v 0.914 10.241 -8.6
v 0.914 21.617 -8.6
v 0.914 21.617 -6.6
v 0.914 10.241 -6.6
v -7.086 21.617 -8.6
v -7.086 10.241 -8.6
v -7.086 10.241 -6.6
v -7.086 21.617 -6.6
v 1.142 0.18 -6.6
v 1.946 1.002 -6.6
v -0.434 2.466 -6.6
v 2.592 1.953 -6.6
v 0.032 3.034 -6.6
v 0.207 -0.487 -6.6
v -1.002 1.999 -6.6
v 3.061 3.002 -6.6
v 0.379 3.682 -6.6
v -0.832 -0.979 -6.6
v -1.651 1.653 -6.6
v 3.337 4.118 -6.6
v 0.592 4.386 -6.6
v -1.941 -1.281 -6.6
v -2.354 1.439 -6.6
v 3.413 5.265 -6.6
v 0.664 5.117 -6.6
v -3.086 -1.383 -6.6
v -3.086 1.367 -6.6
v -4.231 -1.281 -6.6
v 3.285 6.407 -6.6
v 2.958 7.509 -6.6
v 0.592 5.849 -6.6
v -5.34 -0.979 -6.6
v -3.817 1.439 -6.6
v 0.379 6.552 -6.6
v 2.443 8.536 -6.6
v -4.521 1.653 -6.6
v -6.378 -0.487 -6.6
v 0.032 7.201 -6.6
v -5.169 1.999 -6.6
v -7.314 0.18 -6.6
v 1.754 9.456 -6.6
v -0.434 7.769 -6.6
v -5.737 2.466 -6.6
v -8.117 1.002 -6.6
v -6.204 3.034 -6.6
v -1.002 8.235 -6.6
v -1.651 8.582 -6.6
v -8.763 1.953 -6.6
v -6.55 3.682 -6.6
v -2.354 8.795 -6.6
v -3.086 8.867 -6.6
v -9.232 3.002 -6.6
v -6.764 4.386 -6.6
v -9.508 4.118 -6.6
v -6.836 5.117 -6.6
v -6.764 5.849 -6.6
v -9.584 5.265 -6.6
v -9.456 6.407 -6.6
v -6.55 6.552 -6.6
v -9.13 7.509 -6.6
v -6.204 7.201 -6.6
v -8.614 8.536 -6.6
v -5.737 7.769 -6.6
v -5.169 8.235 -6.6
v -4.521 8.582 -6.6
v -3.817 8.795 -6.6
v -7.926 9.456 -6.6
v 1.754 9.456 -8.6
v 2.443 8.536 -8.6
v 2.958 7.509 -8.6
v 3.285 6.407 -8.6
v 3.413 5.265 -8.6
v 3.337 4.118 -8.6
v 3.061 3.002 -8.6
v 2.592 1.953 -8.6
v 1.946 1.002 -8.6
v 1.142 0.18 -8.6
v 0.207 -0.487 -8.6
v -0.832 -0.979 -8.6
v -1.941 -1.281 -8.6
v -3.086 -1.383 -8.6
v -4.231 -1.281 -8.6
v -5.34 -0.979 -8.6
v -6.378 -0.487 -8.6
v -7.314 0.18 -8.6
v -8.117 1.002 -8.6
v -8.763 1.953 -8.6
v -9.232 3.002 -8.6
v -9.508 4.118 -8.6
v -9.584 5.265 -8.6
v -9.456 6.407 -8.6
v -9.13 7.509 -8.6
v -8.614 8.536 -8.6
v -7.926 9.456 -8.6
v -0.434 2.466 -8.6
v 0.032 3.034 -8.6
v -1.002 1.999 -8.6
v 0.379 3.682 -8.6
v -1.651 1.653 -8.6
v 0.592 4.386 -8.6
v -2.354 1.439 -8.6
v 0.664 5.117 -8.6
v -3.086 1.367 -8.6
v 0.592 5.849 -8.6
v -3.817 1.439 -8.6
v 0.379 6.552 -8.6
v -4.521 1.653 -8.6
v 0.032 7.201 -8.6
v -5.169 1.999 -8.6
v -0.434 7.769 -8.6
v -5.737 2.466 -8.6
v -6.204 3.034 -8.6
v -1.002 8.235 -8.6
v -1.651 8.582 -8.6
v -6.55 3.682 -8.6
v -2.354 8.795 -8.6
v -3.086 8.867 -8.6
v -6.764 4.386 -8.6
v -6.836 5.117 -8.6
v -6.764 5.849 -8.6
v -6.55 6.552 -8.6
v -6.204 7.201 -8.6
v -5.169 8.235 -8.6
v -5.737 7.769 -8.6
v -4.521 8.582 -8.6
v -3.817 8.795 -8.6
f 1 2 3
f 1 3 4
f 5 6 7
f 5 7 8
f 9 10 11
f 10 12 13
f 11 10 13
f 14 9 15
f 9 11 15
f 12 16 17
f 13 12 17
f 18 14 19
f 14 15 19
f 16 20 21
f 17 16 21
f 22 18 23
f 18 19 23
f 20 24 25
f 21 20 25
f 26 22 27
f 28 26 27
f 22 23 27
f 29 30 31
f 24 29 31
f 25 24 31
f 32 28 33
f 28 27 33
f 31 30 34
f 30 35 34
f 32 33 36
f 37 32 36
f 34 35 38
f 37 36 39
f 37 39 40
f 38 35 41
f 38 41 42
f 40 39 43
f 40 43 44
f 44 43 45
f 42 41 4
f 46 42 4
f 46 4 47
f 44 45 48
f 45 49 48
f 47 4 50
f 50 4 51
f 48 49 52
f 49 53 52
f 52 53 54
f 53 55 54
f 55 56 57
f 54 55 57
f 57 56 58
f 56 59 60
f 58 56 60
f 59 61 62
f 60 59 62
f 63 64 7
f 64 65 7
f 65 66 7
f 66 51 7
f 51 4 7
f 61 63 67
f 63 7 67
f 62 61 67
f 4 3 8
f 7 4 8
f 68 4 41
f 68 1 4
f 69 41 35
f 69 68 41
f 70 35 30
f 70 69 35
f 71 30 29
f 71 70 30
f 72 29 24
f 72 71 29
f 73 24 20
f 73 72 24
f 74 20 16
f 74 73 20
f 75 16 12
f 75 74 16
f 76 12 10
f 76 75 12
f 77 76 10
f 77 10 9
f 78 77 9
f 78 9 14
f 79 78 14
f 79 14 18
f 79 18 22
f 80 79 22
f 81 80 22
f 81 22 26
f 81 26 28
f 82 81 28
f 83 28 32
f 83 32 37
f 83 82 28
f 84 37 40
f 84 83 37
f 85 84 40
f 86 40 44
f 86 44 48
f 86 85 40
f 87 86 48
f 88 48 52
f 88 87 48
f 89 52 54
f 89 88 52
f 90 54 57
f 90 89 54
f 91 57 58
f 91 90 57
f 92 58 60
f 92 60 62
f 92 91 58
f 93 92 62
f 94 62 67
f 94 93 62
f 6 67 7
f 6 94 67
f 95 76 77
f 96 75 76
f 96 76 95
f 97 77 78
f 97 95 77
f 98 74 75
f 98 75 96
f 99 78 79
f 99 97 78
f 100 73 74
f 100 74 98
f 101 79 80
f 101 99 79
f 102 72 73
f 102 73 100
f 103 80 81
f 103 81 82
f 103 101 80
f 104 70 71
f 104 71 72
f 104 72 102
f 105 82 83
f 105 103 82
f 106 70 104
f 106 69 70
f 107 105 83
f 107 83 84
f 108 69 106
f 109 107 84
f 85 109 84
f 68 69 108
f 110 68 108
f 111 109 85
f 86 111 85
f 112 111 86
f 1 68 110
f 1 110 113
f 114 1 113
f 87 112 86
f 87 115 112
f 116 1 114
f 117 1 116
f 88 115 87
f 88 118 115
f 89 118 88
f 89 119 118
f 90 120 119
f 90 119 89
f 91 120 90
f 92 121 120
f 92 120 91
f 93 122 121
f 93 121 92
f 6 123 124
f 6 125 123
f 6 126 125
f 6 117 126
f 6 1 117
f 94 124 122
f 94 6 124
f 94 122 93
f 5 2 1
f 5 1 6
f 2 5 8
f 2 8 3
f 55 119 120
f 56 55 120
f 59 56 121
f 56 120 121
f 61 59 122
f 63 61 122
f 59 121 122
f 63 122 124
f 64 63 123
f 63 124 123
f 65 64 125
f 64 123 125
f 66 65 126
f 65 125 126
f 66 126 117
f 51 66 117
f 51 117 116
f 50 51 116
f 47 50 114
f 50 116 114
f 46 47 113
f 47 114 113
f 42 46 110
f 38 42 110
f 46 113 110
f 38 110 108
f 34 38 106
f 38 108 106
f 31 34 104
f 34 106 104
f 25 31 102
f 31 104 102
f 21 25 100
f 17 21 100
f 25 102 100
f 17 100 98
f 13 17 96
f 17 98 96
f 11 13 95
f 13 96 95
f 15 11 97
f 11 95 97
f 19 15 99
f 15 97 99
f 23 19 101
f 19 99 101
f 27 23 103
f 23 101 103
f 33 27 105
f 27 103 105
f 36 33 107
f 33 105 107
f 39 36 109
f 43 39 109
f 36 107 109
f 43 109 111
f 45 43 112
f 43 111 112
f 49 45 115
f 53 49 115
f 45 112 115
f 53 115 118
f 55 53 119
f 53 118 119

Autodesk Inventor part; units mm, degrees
ref_plane "YZ Plane" through (0, 0, 0) normal (1, 0, 0) x (0, 1, 0)
ref_plane "XZ Plane" through (0, 0, 0) normal (0, 1, 0) x (-1, 0, 0)
ref_plane "Work Plane1" through (0, 0, -6.6) normal (0, 0, -1) x (-1, 0, 0)
sketch "Sketch1" plane through (0, 0, -6.6) normal (0, 0, -1) x (-1, 0, 0)
  circle A0 centre (3.0857, 5.1173) radius 10 projected
  line L0 (-6.9143, 5.1173) -> (-6.9143, 18.1173)
  line L1 (-6.9143, 18.1173) -> (13.0857, 18.1173)
  line L2 (13.0857, 18.1173) -> (13.0857, 5.1173)
  circle A1 centre (0, 0) radius 5
  point P0 (0, 0)
  dimension "d24" = 13
  dimension "d25" = 20
ref_plane "Work Plane2" through (-10, -10, -4.4) normal (0, 0, 1) x (1, 0, 0)
extrude "Extrusion1" add sketch "Sketch1" along normal blind 2 contours A0 A1 | A0 L0 L1 L2 | A0 A1 picked at (6.1055, 10.6249) picked at (0.8611, -2.5748)
sketch "Sketch9" plane through (0, 0, -8.6) normal (0, 0, -1) x (-1, 0, 0)
  circle A0 centre (3.0857, 5.1173) radius 5 construction
  arc A1 (-6.9143, 5.1173) -> (13.0857, 5.1173) centre (3.0857, 5.1173) ccw projected
  circle A2 centre (3.0857, 5.1173) radius 3.75
  dimension "d43" = 7.5
extrude "Extrusion6" cut sketch "Sketch9" against normal up to surface (2 mm away)
sketch "Sketch10" plane through (0, 0, -8.6) normal (0, 0, -1) x (-1, 0, 0)
  arc A0 (-6.9143, 5.1173) -> (13.0857, 5.1173) centre (3.0857, 5.1173) ccw projected
  line L0 (3.0857, -4.8827) -> (3.0857, -2.8827)
  line L1 (3.0857, -2.8827) -> (4.5857, -2.8827)
  line L2 (4.5857, -2.8827) -> (3.0857, -2.8827)
  line L3 (-2.1325, -2.8827) -> (-2.1325, -5.7607)
  line L4 (4.5857, -2.8827) -> (4.5857, -3.3119)
  line L5 (-2.1325, -5.7607) -> (-2.1325, -7.2943)
  line L6 (4.5857, -3.3119) -> (4.5857, -2.7408)
  line L7 (-4, 15) -> (-4, 13) construction
  line L8 (4, 13) -> (4, 15) construction
  line L9 (13.0857, 18.1173) -> (-6.9143, 18.1173) projected
  line L10 (-6.9143, 18.1173) -> (13.0857, 18.1173)
  line L11 (-6.9143, 18.1173) -> (-6.9143, 5.1173)
  line L12 (13.0857, 18.1173) -> (13.0857, 5.1173)
  arc A1 (-6.9143, 5.1173) -> (13.0857, 5.1173) centre (3.0857, 5.1173) ccw
  circle A2 centre (3.0857, 5.1173) radius 6.5
  line L13 (3.0857, 5.1173) -> (3.0857, 11.6173) construction
  line L14 (3.0857, 11.6173) -> (7.0857, 11.6173)
  line L15 (7.0857, 11.6173) -> (3.0857, 11.6173)
  line L16 (3.0857, 11.6173) -> (-0.9143, 11.6173)
  line L17 (-0.9143, 10.2408) -> (-0.9143, 18.1173)
  line L18 (-0.9143, 18.1173) -> (7.0857, 18.1173)
  line L19 (7.0857, 18.1173) -> (7.0857, 10.2408)
  point P0 (5.6921, -0.9362)
  dimension "d31" = 2
  dimension "d37" = 1.5
  dimension "d44" = 4
  dimension "d45" = 4
extrude "Extrusion8" cut sketch "Sketch10" against normal up to next contours A0 L11 L9 L17 A2 L19 L12
sketch "Sketch11" plane through (0, 0, -8.6) normal (0, 0, -1) x (-1, 0, 0)
  line L0 (7.0857, 18.1173) -> (-0.9143, 18.1173) projected
  line L1 (7.0857, 18.1173) -> (7.0857, 21.6173)
  line L2 (7.0857, 21.6173) -> (-0.9143, 21.6173)
  line L3 (-0.9143, 21.6173) -> (-0.9143, 18.1173)
  point P0 (0, 0)
  dimension "d46" = 3.5
extrude "Extrusion9" add sketch "Sketch11" against normal up to surface (2 mm away)
